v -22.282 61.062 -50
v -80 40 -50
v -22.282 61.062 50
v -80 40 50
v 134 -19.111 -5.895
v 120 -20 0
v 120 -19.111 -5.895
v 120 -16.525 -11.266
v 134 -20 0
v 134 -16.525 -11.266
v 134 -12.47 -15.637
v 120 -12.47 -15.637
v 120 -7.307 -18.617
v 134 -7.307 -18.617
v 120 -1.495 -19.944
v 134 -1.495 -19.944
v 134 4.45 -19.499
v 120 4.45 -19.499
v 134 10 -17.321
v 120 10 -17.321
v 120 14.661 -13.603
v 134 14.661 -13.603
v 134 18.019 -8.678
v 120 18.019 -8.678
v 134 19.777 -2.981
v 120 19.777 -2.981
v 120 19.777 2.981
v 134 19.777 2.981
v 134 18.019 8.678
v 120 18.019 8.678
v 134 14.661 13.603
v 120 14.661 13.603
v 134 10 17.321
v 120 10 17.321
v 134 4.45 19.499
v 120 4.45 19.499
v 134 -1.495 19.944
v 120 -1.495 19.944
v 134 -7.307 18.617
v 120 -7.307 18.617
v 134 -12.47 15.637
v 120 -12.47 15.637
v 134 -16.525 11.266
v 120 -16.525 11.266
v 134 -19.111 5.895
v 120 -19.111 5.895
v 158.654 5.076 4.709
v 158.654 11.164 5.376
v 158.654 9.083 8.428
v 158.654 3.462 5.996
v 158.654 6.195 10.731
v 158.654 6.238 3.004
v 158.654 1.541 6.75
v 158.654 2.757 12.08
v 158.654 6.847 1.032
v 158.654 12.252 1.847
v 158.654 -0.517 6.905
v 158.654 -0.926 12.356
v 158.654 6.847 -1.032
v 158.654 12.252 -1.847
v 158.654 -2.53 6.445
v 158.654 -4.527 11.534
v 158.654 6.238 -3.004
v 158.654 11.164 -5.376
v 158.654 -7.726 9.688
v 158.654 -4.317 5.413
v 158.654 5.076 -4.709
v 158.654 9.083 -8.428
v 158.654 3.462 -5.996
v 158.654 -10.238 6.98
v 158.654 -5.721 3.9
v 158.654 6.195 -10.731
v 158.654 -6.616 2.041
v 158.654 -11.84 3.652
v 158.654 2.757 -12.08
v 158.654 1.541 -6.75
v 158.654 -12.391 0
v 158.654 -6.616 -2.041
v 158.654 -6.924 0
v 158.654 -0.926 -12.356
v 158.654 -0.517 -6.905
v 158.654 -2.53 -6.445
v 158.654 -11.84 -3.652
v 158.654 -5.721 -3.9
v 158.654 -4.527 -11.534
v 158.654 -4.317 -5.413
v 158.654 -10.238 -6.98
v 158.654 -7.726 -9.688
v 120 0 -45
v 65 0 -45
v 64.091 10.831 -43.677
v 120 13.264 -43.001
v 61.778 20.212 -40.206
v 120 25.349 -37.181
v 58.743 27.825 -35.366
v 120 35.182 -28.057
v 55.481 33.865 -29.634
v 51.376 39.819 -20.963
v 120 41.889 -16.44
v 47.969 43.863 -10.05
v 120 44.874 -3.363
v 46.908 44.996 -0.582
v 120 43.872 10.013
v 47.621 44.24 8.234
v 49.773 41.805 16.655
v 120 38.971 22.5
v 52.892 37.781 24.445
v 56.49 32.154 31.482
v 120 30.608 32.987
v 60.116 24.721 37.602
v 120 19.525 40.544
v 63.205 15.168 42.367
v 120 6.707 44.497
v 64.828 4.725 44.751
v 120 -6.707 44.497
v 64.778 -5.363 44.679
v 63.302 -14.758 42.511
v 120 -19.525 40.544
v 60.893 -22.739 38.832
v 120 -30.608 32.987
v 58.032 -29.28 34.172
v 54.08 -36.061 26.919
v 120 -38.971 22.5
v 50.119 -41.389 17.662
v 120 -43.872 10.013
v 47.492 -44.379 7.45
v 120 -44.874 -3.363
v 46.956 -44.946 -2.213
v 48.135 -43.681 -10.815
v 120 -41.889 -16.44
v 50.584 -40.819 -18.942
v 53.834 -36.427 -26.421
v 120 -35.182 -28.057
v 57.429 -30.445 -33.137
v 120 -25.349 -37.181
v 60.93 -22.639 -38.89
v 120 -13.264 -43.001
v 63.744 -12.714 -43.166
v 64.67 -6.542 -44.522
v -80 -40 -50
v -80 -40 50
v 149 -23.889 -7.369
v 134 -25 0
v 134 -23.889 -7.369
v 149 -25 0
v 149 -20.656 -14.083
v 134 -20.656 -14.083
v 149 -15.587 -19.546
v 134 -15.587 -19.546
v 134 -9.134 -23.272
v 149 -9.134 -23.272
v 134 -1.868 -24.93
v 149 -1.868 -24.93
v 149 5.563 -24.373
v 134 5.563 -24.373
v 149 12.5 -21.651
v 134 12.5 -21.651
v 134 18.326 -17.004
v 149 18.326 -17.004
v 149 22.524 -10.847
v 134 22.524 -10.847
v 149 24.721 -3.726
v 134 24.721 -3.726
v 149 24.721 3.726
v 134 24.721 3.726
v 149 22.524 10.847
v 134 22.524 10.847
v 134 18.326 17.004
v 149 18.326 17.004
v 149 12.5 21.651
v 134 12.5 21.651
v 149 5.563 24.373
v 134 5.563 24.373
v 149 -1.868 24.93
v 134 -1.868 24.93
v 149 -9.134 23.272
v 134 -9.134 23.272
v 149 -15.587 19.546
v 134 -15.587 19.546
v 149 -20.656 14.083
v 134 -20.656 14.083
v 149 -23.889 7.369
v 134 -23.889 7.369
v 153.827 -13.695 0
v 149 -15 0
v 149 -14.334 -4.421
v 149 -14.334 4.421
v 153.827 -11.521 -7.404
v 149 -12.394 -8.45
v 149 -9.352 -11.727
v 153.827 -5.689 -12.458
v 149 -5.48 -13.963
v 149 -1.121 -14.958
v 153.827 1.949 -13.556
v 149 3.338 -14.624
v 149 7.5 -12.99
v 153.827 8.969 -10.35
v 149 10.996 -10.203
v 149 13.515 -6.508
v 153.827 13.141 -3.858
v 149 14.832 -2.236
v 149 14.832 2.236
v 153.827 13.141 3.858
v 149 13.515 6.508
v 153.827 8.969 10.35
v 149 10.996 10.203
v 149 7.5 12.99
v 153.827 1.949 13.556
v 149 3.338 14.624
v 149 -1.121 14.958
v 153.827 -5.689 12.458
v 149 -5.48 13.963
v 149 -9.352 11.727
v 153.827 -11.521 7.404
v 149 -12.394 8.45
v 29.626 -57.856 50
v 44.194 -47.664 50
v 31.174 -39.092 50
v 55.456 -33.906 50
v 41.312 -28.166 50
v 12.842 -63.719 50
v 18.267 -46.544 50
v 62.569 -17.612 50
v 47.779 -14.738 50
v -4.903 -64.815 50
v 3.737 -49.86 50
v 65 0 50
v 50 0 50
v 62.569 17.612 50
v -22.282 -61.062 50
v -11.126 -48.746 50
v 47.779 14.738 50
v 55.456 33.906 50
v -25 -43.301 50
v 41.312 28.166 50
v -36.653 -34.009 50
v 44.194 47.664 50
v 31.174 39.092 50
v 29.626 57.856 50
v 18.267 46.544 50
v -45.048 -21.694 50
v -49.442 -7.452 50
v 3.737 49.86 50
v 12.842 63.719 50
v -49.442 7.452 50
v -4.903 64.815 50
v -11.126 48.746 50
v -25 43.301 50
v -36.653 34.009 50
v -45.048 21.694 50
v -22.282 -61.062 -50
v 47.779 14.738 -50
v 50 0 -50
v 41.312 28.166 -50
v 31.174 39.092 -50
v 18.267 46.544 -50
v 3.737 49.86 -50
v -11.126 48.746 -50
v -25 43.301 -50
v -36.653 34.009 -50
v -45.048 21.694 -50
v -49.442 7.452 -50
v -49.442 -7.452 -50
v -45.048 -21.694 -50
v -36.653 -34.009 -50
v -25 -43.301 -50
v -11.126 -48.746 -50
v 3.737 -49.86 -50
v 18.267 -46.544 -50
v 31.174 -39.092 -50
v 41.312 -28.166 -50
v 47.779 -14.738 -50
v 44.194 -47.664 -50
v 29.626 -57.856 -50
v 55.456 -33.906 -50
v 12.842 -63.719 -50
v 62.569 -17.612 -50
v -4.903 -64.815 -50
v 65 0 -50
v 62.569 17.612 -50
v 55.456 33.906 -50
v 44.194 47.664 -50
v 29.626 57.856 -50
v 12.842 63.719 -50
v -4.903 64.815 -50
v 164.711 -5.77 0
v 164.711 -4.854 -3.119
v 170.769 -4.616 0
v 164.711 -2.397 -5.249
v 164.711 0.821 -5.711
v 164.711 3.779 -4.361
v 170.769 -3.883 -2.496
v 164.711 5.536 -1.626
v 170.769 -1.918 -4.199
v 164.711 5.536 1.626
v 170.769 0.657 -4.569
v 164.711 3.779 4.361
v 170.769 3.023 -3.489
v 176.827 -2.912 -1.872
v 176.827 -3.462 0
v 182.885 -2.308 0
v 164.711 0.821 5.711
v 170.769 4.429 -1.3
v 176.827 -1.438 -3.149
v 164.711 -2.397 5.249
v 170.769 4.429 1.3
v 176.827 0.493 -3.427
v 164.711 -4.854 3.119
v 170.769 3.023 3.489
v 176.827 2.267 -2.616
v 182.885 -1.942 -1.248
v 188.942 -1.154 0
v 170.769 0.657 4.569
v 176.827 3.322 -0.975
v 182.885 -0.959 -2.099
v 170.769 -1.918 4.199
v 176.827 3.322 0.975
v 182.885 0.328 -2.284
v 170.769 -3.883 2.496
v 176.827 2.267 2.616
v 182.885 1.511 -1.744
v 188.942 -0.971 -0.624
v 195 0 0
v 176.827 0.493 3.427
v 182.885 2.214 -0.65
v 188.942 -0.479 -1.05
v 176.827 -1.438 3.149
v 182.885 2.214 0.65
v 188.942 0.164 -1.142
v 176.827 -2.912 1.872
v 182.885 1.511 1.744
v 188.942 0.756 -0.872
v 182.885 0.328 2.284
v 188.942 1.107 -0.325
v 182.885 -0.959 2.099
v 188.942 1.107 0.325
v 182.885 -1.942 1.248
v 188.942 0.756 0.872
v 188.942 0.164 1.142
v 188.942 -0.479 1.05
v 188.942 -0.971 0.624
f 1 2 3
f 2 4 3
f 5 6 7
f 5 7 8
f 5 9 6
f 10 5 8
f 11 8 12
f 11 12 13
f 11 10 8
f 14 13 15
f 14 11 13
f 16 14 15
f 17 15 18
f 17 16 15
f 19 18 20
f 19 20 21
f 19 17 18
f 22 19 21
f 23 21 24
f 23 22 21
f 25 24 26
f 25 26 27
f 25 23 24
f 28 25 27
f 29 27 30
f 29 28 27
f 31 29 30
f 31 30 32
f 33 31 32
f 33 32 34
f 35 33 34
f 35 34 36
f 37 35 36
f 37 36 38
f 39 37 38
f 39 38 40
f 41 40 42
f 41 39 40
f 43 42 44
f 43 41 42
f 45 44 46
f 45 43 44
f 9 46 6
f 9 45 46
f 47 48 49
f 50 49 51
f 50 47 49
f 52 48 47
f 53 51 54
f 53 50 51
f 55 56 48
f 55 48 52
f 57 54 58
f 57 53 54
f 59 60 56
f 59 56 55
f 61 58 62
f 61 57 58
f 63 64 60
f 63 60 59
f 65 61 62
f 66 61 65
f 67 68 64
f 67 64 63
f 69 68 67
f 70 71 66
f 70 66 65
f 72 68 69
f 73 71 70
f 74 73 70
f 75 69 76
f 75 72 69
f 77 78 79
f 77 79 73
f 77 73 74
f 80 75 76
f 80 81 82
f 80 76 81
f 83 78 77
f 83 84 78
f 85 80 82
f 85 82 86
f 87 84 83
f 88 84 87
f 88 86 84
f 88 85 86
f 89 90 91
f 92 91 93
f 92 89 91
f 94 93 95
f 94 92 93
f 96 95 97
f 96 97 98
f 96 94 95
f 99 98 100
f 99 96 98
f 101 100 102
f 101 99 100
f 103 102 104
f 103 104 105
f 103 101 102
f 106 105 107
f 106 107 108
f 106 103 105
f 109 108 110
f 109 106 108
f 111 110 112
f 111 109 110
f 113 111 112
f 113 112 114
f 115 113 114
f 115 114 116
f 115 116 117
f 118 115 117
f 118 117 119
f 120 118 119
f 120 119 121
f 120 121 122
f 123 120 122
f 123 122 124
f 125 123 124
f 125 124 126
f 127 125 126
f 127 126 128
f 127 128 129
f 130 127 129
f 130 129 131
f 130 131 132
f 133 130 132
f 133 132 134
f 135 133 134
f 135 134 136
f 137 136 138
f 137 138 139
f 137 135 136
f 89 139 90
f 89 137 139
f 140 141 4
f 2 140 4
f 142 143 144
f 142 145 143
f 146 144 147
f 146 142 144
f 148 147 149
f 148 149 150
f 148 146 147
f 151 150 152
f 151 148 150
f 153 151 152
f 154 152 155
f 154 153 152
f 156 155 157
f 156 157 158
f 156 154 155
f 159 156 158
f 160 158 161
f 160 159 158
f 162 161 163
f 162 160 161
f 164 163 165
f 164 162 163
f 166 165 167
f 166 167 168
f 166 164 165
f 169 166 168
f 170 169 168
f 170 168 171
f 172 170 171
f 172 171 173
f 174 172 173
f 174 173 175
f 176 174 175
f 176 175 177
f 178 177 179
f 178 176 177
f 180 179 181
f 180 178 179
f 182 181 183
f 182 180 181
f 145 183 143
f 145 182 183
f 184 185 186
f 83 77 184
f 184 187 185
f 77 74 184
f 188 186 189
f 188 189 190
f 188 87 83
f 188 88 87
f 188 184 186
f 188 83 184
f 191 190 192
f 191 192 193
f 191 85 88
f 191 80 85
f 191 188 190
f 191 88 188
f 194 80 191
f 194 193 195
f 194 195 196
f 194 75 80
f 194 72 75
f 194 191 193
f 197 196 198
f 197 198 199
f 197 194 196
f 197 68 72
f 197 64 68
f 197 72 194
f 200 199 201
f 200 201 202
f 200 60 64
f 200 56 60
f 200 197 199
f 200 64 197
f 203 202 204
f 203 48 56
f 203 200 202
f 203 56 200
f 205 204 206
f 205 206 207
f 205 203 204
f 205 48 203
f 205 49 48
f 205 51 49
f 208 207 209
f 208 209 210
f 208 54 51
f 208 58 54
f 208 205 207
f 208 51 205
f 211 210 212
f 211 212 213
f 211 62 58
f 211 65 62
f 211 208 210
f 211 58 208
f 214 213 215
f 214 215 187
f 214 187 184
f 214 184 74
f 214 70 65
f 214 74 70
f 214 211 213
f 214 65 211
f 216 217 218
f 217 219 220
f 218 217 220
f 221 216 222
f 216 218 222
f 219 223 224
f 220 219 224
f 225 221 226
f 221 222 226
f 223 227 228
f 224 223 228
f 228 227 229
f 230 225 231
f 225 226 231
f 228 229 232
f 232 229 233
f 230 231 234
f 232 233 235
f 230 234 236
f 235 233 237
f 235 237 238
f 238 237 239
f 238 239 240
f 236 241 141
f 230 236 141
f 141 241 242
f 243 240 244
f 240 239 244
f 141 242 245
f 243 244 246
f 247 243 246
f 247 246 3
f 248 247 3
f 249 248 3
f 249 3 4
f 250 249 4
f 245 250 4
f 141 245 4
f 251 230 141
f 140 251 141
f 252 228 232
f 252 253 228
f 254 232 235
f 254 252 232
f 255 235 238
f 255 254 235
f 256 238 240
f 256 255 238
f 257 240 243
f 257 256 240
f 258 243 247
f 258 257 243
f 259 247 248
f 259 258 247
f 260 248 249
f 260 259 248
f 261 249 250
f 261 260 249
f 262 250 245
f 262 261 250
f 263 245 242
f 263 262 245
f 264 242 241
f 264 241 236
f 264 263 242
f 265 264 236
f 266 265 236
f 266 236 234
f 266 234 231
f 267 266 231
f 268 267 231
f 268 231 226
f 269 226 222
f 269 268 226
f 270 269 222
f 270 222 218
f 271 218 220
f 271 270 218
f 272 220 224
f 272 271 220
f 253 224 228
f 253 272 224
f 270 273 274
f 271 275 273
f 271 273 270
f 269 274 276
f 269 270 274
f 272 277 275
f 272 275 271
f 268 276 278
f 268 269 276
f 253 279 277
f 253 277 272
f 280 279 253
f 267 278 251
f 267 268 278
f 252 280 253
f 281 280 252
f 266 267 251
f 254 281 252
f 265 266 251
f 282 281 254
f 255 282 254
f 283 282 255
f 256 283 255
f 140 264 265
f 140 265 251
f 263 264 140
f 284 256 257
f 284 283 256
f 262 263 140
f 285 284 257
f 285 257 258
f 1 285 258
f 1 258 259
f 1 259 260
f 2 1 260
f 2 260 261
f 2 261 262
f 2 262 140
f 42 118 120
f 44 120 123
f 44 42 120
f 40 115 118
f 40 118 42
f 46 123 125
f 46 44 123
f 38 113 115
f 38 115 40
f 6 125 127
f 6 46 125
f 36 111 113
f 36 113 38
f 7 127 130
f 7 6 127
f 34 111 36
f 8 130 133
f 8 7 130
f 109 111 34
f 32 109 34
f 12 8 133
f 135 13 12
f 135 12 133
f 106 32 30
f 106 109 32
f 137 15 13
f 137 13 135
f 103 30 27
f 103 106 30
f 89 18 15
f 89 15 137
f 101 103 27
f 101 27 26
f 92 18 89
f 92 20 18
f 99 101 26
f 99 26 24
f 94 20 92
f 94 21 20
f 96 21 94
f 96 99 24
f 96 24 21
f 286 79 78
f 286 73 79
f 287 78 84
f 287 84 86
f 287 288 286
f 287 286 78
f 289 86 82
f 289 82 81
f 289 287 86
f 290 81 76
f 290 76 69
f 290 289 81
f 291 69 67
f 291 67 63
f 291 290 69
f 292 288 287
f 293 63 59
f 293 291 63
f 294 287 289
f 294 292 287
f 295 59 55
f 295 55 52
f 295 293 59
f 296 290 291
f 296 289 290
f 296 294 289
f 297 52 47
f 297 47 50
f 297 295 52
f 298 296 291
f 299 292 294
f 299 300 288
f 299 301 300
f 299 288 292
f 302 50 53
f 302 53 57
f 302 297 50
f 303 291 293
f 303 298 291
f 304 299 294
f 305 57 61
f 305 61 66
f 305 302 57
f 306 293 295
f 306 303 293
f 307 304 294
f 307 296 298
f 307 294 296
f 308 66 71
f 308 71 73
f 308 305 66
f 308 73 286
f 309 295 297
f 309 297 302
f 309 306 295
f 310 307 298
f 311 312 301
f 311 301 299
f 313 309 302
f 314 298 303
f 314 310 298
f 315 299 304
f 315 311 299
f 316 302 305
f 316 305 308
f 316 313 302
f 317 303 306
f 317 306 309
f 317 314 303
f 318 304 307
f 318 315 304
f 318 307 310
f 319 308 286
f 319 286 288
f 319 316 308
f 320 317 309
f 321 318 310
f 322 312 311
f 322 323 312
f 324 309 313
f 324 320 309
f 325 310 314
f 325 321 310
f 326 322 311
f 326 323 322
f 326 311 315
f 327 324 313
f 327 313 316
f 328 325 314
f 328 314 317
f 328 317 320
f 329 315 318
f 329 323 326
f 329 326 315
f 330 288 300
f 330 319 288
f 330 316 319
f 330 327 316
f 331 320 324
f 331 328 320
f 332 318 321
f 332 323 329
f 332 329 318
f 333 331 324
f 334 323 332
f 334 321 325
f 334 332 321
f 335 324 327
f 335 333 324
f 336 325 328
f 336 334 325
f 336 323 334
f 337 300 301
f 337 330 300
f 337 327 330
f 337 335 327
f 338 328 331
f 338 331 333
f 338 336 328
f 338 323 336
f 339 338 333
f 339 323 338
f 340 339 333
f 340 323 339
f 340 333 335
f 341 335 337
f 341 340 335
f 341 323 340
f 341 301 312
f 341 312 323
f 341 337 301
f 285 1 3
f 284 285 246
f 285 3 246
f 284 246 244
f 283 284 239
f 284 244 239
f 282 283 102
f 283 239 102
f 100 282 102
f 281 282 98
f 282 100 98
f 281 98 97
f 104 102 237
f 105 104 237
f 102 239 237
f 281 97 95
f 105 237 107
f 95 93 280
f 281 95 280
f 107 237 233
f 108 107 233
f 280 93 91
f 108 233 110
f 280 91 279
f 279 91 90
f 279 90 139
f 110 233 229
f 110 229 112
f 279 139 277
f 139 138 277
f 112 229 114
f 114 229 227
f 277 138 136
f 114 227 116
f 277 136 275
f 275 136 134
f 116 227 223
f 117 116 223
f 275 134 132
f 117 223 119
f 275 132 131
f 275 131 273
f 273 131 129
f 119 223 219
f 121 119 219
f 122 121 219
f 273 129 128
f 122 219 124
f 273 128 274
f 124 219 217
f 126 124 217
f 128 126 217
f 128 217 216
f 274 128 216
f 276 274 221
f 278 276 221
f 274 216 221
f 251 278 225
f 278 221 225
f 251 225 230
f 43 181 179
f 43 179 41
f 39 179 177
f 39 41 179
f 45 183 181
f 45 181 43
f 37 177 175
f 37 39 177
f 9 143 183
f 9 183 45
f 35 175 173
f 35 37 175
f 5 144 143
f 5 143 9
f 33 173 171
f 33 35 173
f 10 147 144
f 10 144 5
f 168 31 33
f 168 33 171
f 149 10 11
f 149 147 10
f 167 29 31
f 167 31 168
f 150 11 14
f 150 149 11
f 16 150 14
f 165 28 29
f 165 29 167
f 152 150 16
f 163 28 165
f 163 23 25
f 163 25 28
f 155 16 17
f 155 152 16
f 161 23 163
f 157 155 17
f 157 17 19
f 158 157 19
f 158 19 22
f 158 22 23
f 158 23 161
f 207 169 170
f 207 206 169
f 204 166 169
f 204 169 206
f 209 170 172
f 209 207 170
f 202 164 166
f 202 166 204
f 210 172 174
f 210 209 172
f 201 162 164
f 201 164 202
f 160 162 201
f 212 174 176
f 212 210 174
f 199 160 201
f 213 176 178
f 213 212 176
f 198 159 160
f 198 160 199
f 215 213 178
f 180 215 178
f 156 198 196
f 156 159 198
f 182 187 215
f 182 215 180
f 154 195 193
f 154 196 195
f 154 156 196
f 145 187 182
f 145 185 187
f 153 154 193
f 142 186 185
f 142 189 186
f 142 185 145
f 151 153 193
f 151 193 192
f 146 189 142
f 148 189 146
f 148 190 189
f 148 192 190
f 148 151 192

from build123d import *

# Parameters (mm, degrees)
SKETCH1_R           = 50
BOSS_EXTRUDE1_DEPTH = 50
BOSS_EXTRUDE2_REACH = 202
SKETCH2_R           = 45


with BuildPart() as part:
    # Sketch1 → Boss-Extrude1 (new body, symmetric)
    with BuildSketch(Plane.XY):
        with BuildLine():
            Line((-80, -40), (-80, 40))
            Line((-80, 40), (-22.281665693, 61.061668614))
            ThreePointArc((-22.281665693, 61.061668614), (65, 0), (-22.281665693, -61.061668614))
            Line((-22.281665693, -61.061668614), (-80, -40))
        make_face()
        Circle(SKETCH1_R, mode=Mode.SUBTRACT)
    extrude(amount=BOSS_EXTRUDE1_DEPTH, both=True)

    # Sketch2 → Boss-Extrude2 (add, up to next)
    with BuildSketch(Plane(origin=(120, 0, 0), x_dir=(0, 0, -1), z_dir=(1, 0, 0)), mode=Mode.PRIVATE) as boss_extrude2_sk1:
        Circle(SKETCH2_R)
    boss_extrude2_tool1 = extrude(boss_extrude2_sk1.sketch, amount=-BOSS_EXTRUDE2_REACH, mode=Mode.PRIVATE) - part.part
    add(boss_extrude2_tool1.solids().sort_by_distance((120, 0, 0))[0])

    # Sketch4 → Revolve1 (revolve)
    with BuildSketch(Plane.XY):
        Polygon((120, 0), (120, -20), (134, -20), (134, -25), (149, -25), (149, -15), (158.653629462, -12.390893217), (158.653629462, -6.923969146), (195, 0), align=None)
    revolve(axis=Axis((0, 0, 0), (1, 0, 0)))


solid = part.part
